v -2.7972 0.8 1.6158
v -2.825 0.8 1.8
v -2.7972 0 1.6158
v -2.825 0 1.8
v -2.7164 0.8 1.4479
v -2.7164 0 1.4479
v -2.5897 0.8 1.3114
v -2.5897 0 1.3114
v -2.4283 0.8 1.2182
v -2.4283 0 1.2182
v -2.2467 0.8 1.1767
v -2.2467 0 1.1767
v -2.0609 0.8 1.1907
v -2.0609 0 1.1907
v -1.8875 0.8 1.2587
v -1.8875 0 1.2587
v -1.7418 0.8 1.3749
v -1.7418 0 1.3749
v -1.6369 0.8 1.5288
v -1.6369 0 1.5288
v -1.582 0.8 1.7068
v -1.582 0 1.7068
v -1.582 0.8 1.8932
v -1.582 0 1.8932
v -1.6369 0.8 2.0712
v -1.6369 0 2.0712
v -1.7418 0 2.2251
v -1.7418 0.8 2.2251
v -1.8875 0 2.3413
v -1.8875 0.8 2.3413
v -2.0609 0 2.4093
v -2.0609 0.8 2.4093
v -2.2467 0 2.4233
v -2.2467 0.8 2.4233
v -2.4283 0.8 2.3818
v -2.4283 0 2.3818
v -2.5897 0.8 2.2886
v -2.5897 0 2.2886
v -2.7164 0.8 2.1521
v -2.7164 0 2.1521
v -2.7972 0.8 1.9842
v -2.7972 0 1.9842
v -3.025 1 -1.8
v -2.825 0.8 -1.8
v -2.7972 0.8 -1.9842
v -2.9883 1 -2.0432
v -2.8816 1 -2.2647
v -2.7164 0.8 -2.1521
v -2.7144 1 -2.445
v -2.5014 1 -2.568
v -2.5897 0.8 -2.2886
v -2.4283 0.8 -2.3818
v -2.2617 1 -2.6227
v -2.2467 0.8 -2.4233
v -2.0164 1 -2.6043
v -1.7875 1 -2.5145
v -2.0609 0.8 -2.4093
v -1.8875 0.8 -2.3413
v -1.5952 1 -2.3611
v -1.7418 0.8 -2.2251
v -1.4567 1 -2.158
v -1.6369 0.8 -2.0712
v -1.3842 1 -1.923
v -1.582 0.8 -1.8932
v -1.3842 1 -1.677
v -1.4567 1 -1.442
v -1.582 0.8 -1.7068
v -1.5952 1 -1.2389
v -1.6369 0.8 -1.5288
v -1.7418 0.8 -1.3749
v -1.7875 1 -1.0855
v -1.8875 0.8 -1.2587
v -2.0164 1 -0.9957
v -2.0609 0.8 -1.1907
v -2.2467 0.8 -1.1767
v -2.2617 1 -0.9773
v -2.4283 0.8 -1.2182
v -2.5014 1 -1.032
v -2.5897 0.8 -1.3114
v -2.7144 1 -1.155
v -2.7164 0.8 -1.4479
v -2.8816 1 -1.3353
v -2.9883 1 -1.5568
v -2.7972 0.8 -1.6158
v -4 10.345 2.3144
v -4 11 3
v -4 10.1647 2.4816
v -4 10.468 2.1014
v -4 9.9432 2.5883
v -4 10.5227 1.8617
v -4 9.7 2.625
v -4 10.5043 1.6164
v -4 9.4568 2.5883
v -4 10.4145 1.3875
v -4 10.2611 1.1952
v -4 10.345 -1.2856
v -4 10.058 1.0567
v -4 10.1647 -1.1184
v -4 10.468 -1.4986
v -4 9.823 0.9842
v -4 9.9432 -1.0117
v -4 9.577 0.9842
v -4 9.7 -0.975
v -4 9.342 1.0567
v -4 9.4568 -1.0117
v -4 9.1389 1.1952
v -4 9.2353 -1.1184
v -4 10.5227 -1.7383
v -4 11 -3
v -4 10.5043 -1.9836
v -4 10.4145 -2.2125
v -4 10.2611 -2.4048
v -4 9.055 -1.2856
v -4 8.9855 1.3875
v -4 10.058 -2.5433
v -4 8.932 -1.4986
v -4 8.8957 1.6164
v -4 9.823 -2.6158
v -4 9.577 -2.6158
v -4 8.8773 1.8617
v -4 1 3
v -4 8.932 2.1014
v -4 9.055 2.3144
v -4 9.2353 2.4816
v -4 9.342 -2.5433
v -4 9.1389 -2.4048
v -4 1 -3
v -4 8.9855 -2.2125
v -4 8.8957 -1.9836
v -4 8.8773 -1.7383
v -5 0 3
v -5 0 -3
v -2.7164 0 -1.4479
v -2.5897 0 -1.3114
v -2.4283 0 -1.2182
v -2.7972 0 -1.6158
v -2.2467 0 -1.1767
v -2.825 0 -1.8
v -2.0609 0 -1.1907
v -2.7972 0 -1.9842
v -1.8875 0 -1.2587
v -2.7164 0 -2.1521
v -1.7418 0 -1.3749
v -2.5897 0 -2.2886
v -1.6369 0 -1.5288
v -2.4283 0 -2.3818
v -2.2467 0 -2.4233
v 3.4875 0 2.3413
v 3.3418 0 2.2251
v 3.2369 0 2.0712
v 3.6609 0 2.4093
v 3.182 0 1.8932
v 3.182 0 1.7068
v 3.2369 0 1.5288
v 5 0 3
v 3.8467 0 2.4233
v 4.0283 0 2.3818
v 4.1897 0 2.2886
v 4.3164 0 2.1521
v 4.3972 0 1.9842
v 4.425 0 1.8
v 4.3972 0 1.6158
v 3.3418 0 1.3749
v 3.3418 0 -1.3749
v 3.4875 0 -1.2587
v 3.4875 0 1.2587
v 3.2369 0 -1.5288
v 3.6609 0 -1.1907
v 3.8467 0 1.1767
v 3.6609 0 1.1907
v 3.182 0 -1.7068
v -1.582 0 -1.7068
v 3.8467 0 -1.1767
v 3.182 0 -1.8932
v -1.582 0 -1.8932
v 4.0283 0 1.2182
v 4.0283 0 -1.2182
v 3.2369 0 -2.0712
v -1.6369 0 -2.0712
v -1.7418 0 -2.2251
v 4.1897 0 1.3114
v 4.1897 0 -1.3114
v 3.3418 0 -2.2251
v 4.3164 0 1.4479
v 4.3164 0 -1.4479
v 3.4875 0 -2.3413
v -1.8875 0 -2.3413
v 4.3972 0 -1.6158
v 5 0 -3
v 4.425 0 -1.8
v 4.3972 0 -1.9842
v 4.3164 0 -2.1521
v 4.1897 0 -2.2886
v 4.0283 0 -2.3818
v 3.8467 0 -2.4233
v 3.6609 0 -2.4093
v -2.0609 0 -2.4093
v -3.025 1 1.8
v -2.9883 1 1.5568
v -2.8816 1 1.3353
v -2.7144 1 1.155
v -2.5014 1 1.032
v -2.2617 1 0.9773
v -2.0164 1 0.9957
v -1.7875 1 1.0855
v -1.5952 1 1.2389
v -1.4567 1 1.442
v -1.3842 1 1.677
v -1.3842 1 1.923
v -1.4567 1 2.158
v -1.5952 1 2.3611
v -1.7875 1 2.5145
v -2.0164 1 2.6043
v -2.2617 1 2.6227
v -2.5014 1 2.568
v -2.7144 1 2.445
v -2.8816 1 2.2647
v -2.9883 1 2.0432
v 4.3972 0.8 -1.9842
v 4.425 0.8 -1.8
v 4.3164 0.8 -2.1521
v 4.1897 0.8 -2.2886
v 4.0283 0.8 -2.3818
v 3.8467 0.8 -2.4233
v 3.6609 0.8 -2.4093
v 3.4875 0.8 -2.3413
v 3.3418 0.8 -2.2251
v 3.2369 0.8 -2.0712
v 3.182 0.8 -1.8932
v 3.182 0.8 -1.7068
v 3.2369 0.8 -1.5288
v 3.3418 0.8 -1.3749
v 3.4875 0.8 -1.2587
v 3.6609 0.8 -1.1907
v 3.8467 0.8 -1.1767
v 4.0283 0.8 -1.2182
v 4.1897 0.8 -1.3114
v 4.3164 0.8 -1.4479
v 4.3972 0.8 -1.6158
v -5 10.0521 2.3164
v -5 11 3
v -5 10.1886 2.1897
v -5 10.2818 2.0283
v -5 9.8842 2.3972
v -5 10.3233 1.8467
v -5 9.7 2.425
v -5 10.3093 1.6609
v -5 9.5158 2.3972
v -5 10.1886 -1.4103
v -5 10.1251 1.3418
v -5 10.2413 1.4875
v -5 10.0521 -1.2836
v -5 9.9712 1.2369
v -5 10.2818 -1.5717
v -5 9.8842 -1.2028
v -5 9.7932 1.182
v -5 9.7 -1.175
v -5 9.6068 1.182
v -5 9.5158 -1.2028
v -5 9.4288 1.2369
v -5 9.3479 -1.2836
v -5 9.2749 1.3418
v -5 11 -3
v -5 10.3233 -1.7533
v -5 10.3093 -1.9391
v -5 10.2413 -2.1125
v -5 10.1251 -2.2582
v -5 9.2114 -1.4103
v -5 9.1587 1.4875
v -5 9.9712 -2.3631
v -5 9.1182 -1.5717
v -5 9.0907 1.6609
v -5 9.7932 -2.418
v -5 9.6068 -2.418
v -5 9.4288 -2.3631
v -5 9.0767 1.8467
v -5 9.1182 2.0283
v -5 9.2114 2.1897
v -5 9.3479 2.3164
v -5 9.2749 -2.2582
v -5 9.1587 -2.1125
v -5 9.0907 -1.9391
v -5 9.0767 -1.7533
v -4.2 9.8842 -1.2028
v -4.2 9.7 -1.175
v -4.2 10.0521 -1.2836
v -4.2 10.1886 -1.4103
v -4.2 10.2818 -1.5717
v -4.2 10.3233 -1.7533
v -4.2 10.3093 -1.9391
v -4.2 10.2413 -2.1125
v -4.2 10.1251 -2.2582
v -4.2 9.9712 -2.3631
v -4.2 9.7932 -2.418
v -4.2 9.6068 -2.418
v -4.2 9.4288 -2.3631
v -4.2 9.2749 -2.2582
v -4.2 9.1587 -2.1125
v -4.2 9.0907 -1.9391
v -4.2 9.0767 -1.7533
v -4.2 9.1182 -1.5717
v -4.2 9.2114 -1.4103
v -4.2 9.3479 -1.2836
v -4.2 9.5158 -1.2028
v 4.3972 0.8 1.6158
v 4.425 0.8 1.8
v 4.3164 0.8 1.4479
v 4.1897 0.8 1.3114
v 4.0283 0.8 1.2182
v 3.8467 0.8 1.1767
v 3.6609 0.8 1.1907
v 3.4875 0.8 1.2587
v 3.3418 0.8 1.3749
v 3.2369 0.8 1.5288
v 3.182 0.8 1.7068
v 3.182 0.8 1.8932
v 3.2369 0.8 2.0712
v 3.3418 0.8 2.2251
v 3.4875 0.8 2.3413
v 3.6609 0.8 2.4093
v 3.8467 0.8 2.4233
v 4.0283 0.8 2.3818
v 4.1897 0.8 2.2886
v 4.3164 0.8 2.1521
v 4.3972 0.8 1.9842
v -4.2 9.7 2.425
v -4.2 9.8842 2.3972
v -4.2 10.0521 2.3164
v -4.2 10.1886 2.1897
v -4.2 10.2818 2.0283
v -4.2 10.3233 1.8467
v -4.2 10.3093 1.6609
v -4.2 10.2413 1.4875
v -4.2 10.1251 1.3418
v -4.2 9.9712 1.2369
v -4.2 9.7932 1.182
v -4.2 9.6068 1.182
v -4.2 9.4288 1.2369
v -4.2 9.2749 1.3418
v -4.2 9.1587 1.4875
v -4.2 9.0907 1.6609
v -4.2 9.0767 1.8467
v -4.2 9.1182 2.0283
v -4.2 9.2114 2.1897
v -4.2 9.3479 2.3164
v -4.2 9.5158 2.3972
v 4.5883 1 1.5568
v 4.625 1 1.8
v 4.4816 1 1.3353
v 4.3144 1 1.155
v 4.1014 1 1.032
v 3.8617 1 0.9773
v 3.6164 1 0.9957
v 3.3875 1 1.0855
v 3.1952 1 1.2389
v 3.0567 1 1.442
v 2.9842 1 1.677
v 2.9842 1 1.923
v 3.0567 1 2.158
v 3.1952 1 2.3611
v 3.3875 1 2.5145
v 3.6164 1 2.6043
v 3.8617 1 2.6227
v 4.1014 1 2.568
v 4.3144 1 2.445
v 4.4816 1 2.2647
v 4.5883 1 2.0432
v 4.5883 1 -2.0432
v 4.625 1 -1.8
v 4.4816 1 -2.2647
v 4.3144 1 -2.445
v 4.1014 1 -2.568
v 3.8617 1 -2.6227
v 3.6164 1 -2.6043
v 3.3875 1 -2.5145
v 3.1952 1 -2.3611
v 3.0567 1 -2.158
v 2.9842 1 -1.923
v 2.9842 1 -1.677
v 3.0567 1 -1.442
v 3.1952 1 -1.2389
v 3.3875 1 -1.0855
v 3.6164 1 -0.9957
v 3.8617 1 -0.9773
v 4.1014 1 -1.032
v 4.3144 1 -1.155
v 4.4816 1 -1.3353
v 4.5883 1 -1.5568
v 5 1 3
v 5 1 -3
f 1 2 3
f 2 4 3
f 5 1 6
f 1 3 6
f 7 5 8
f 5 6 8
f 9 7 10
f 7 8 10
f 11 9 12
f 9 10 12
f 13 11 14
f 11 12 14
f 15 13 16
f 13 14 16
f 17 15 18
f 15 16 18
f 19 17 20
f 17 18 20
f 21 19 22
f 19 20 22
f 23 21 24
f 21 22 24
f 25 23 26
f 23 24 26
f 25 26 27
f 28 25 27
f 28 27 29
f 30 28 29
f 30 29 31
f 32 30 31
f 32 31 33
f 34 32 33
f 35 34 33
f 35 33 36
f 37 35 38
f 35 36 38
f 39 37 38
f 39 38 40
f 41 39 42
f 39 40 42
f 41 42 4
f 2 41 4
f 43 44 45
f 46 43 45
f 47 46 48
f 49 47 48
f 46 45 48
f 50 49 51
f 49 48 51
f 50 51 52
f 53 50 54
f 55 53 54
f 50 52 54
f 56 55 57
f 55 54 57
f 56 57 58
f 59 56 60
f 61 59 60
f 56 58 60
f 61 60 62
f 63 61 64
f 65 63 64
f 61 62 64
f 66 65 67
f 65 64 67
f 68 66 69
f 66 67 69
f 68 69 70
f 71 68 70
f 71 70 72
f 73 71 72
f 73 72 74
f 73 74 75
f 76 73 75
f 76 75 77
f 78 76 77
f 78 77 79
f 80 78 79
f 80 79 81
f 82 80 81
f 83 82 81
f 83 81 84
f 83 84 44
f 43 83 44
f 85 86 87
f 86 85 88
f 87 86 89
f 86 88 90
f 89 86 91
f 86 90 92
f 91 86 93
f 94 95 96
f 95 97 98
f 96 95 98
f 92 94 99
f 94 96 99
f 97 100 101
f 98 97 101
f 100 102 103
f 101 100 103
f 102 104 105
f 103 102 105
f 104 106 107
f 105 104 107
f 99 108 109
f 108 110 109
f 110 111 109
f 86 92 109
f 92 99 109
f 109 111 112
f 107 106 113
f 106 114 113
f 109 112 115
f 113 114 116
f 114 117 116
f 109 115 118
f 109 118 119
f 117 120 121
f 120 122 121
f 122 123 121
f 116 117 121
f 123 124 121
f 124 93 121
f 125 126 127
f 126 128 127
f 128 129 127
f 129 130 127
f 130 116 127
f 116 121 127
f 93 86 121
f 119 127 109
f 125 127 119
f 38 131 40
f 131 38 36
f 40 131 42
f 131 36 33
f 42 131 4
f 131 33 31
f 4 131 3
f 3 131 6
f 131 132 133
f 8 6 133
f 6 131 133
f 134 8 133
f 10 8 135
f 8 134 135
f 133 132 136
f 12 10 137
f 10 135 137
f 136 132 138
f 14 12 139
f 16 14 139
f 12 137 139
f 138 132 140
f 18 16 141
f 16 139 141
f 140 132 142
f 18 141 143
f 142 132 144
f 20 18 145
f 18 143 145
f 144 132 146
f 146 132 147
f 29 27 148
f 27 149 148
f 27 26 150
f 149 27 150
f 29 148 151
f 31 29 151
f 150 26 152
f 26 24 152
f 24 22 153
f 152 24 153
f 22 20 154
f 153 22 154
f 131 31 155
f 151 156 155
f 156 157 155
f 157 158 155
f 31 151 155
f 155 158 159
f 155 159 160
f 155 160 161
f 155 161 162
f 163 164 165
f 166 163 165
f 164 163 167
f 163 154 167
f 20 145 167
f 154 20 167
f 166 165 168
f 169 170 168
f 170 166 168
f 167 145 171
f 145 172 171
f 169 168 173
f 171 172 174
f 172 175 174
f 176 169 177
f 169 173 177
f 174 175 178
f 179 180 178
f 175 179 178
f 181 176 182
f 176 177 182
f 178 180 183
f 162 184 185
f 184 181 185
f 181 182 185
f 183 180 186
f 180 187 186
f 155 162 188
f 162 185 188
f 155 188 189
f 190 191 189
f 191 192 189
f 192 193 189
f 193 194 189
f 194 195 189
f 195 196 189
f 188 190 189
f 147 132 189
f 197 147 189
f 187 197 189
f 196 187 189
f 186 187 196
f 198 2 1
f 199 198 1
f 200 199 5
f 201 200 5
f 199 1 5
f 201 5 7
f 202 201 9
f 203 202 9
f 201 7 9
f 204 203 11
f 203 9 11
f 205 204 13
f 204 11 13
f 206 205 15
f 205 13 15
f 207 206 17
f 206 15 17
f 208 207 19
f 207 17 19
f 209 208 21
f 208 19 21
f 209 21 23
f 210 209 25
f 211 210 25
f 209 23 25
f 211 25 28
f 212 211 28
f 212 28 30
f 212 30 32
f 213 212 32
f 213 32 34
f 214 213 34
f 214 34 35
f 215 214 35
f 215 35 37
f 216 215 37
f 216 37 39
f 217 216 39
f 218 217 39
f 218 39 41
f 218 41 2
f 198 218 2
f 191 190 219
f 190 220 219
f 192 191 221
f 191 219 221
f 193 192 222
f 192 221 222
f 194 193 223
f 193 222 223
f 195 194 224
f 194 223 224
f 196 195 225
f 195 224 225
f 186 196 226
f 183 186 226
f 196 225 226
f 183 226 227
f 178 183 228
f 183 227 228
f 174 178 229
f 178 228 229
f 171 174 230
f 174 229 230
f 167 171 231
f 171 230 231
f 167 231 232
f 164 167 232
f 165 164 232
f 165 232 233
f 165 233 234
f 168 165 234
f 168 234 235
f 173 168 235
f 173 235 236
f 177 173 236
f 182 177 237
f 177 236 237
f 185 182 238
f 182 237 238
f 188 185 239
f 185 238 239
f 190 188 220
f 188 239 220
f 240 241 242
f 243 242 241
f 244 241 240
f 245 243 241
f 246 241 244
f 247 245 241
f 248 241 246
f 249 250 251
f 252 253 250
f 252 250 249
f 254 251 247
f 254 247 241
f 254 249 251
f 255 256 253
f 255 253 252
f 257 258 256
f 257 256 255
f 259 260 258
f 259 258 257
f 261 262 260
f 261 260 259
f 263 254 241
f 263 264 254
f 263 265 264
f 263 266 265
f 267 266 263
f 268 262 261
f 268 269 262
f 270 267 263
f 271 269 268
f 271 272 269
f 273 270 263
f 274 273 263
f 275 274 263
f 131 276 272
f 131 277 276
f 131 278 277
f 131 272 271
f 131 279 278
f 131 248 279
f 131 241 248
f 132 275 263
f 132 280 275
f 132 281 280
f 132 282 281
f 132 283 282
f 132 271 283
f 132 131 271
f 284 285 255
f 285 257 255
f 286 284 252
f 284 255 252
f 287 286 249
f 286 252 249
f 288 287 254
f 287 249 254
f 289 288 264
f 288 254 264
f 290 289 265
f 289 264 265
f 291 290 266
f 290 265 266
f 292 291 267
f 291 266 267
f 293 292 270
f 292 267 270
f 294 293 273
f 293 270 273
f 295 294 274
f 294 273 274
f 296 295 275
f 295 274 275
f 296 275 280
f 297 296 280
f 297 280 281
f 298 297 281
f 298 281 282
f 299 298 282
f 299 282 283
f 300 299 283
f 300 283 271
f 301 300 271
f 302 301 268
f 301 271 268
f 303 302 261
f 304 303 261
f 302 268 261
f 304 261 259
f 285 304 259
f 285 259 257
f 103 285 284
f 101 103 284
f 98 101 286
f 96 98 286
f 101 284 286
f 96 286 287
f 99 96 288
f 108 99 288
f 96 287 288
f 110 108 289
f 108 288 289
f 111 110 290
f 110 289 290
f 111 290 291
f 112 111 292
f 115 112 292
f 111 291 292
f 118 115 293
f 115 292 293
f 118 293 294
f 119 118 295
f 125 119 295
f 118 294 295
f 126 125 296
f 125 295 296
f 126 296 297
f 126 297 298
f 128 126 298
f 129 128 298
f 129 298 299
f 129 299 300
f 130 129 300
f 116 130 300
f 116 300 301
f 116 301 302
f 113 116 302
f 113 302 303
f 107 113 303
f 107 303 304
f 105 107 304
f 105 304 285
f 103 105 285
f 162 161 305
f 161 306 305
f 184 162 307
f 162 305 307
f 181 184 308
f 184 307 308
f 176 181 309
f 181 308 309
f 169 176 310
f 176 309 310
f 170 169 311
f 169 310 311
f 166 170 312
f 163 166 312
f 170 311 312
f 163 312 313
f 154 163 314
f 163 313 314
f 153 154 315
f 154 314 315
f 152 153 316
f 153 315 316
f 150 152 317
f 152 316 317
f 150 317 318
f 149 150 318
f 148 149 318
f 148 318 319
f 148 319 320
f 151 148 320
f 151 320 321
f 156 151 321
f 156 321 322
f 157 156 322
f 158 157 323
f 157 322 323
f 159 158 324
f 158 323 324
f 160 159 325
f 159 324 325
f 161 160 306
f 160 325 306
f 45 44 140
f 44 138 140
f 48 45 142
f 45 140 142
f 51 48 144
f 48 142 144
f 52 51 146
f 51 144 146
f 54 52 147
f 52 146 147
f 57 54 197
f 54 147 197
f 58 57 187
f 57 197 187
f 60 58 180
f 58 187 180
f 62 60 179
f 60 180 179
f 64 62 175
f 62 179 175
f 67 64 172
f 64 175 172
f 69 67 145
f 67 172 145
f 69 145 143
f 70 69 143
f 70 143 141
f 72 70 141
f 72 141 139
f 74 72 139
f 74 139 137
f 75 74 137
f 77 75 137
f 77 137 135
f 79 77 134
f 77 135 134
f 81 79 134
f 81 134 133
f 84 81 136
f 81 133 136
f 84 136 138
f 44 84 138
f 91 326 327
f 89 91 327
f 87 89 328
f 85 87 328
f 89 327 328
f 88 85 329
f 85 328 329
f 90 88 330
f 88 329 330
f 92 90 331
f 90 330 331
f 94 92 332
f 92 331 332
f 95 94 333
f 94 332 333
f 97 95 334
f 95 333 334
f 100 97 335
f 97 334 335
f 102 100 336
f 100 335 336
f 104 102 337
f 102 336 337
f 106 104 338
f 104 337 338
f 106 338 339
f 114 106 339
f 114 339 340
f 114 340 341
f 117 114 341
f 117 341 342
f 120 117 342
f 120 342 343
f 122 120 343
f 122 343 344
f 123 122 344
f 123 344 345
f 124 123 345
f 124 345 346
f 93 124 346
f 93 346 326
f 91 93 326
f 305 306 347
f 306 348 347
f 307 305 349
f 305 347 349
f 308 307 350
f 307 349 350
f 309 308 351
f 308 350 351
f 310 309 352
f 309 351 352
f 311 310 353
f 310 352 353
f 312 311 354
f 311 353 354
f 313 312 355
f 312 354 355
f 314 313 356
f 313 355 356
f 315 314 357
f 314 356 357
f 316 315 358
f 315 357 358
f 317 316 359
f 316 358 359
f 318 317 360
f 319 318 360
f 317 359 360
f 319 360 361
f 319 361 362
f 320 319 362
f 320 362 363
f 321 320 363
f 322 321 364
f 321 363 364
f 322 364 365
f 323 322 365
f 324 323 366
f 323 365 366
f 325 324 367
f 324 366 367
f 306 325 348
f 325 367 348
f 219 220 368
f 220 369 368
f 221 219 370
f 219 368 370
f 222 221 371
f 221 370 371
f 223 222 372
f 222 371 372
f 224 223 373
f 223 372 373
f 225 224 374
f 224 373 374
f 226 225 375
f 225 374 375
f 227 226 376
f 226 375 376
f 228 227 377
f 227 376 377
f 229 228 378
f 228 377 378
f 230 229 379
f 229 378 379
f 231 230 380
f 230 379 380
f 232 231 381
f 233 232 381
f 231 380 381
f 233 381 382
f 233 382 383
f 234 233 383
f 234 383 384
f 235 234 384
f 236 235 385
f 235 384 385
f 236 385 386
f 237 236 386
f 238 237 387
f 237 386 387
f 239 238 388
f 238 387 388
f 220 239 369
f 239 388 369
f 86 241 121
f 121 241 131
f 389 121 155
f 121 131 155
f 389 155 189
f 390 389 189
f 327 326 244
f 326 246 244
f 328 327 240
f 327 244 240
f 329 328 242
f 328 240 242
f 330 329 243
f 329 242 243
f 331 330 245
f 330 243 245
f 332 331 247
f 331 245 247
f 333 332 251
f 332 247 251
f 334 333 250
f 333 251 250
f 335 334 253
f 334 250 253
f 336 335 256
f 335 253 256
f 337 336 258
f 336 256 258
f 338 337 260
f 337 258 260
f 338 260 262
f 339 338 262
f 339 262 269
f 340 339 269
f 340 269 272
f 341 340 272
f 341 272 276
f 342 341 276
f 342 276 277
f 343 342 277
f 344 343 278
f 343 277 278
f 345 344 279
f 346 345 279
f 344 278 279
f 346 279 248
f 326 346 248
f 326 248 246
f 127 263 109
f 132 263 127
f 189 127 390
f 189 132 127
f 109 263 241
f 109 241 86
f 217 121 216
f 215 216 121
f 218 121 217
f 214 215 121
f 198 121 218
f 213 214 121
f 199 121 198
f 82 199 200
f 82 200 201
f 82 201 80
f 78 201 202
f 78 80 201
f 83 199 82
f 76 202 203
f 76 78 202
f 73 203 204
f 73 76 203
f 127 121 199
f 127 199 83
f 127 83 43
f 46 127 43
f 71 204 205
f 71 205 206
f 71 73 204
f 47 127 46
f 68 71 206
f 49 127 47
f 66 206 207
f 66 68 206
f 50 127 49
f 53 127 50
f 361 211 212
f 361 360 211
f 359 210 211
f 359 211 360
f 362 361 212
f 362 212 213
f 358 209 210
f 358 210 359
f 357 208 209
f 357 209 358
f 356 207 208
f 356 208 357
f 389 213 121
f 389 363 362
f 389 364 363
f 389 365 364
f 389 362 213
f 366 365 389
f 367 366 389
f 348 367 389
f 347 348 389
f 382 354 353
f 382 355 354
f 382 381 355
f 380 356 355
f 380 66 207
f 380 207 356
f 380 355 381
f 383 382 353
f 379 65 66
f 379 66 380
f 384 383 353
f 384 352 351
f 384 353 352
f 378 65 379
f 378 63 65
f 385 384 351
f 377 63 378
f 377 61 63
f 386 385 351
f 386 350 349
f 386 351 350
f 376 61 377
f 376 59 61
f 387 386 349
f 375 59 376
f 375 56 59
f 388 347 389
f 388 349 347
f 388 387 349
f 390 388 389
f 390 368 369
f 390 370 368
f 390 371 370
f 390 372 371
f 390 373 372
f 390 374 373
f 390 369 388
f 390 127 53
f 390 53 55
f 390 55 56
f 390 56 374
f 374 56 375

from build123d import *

# Parameters (mm, degrees)
SKETCH_1_W                     = 10
SKETCH_1_H                     = 6
EXTRUDE_1_DEPTH                = 1
SKETCH_2_W                     = 1
SKETCH_2_H                     = 6
EXTRUDE_2_DEPTH                = 10
HOLE_WIZARD_M1_6_2_D           = 1.25
HOLE_WIZARD_M1_6_2_CSINK_D     = 1.65
HOLE_WIZARD_M1_6_2_CSINK_ANGLE = 90
HOLE_WIZARD_M1_6_4_D           = 1.25
HOLE_WIZARD_M1_6_4_CSINK_D     = 1.65
HOLE_WIZARD_M1_6_4_CSINK_ANGLE = 90


# Read off the part's stored shape, not the designer's step: M1.6 螺纹孔3
with BuildPart() as part:
    # 草图1 → 凸台-拉伸1 (new body)
    with BuildSketch(Plane(origin=(0, 0, 0), x_dir=(1, 0, 0), z_dir=(0, 1, 0))):
        Rectangle(SKETCH_1_W, SKETCH_1_H)
    extrude(amount=EXTRUDE_1_DEPTH)

    # 草图2 → 凸台-拉伸2 (add)
    with BuildSketch(Plane(origin=(0, 1, 0), x_dir=(1, 0, 0), z_dir=(0, 1, 0))):
        with Locations((-4.5, 0)):
            Rectangle(SKETCH_2_W, SKETCH_2_H)
    extrude(amount=EXTRUDE_2_DEPTH)

    # M1.6 螺纹孔2 (through all)
    with Locations(Plane(origin=(-4, 0, 0), x_dir=(0, 0, -1), z_dir=(1, 0, 0))):
        with Locations((-1.8, 9.7), (1.8, 9.7)):
            CounterSinkHole(HOLE_WIZARD_M1_6_2_D / 2, HOLE_WIZARD_M1_6_2_CSINK_D / 2, counter_sink_angle=HOLE_WIZARD_M1_6_2_CSINK_ANGLE)

    # M1.6 螺纹孔3 outline → M1.6 螺纹孔3 (revolve, cut)
    with BuildSketch(Plane(origin=(3.8, 0, 1.8), x_dir=(1, 0, 0), z_dir=(0, 0, 1))):
        Polygon((0, 0), (0.625, 0), (0.625, 0.8), (0.825, 1), (0, 1), align=None)
    revolve(axis=Axis((3.8, 0, 1.8), (0, 1, 0)), mode=Mode.SUBTRACT)

    # Hole Wizard M1.6 _3 2 outline → Hole Wizard M1.6 _3 2 (revolve, cut)
    with BuildSketch(Plane(origin=(3.8, 0, -1.8), x_dir=(1, 0, 0), z_dir=(0, 0, 1))):
        Polygon((0, 0), (0.625, 0), (0.625, 0.8), (0.825, 1), (0, 1), align=None)
    revolve(axis=Axis((3.8, 0, -1.8), (0, 1, 0)), mode=Mode.SUBTRACT)

    # M1.6 螺纹孔4 (through all)
    with Locations(Plane(origin=(0, 1, 0), x_dir=(1, 0, 0), z_dir=(0, 1, 0))):
        with Locations((-2.2, -1.8), (-2.2, 1.8)):
            CounterSinkHole(HOLE_WIZARD_M1_6_4_D / 2, HOLE_WIZARD_M1_6_4_CSINK_D / 2, counter_sink_angle=HOLE_WIZARD_M1_6_4_CSINK_ANGLE)


solid = part.part
